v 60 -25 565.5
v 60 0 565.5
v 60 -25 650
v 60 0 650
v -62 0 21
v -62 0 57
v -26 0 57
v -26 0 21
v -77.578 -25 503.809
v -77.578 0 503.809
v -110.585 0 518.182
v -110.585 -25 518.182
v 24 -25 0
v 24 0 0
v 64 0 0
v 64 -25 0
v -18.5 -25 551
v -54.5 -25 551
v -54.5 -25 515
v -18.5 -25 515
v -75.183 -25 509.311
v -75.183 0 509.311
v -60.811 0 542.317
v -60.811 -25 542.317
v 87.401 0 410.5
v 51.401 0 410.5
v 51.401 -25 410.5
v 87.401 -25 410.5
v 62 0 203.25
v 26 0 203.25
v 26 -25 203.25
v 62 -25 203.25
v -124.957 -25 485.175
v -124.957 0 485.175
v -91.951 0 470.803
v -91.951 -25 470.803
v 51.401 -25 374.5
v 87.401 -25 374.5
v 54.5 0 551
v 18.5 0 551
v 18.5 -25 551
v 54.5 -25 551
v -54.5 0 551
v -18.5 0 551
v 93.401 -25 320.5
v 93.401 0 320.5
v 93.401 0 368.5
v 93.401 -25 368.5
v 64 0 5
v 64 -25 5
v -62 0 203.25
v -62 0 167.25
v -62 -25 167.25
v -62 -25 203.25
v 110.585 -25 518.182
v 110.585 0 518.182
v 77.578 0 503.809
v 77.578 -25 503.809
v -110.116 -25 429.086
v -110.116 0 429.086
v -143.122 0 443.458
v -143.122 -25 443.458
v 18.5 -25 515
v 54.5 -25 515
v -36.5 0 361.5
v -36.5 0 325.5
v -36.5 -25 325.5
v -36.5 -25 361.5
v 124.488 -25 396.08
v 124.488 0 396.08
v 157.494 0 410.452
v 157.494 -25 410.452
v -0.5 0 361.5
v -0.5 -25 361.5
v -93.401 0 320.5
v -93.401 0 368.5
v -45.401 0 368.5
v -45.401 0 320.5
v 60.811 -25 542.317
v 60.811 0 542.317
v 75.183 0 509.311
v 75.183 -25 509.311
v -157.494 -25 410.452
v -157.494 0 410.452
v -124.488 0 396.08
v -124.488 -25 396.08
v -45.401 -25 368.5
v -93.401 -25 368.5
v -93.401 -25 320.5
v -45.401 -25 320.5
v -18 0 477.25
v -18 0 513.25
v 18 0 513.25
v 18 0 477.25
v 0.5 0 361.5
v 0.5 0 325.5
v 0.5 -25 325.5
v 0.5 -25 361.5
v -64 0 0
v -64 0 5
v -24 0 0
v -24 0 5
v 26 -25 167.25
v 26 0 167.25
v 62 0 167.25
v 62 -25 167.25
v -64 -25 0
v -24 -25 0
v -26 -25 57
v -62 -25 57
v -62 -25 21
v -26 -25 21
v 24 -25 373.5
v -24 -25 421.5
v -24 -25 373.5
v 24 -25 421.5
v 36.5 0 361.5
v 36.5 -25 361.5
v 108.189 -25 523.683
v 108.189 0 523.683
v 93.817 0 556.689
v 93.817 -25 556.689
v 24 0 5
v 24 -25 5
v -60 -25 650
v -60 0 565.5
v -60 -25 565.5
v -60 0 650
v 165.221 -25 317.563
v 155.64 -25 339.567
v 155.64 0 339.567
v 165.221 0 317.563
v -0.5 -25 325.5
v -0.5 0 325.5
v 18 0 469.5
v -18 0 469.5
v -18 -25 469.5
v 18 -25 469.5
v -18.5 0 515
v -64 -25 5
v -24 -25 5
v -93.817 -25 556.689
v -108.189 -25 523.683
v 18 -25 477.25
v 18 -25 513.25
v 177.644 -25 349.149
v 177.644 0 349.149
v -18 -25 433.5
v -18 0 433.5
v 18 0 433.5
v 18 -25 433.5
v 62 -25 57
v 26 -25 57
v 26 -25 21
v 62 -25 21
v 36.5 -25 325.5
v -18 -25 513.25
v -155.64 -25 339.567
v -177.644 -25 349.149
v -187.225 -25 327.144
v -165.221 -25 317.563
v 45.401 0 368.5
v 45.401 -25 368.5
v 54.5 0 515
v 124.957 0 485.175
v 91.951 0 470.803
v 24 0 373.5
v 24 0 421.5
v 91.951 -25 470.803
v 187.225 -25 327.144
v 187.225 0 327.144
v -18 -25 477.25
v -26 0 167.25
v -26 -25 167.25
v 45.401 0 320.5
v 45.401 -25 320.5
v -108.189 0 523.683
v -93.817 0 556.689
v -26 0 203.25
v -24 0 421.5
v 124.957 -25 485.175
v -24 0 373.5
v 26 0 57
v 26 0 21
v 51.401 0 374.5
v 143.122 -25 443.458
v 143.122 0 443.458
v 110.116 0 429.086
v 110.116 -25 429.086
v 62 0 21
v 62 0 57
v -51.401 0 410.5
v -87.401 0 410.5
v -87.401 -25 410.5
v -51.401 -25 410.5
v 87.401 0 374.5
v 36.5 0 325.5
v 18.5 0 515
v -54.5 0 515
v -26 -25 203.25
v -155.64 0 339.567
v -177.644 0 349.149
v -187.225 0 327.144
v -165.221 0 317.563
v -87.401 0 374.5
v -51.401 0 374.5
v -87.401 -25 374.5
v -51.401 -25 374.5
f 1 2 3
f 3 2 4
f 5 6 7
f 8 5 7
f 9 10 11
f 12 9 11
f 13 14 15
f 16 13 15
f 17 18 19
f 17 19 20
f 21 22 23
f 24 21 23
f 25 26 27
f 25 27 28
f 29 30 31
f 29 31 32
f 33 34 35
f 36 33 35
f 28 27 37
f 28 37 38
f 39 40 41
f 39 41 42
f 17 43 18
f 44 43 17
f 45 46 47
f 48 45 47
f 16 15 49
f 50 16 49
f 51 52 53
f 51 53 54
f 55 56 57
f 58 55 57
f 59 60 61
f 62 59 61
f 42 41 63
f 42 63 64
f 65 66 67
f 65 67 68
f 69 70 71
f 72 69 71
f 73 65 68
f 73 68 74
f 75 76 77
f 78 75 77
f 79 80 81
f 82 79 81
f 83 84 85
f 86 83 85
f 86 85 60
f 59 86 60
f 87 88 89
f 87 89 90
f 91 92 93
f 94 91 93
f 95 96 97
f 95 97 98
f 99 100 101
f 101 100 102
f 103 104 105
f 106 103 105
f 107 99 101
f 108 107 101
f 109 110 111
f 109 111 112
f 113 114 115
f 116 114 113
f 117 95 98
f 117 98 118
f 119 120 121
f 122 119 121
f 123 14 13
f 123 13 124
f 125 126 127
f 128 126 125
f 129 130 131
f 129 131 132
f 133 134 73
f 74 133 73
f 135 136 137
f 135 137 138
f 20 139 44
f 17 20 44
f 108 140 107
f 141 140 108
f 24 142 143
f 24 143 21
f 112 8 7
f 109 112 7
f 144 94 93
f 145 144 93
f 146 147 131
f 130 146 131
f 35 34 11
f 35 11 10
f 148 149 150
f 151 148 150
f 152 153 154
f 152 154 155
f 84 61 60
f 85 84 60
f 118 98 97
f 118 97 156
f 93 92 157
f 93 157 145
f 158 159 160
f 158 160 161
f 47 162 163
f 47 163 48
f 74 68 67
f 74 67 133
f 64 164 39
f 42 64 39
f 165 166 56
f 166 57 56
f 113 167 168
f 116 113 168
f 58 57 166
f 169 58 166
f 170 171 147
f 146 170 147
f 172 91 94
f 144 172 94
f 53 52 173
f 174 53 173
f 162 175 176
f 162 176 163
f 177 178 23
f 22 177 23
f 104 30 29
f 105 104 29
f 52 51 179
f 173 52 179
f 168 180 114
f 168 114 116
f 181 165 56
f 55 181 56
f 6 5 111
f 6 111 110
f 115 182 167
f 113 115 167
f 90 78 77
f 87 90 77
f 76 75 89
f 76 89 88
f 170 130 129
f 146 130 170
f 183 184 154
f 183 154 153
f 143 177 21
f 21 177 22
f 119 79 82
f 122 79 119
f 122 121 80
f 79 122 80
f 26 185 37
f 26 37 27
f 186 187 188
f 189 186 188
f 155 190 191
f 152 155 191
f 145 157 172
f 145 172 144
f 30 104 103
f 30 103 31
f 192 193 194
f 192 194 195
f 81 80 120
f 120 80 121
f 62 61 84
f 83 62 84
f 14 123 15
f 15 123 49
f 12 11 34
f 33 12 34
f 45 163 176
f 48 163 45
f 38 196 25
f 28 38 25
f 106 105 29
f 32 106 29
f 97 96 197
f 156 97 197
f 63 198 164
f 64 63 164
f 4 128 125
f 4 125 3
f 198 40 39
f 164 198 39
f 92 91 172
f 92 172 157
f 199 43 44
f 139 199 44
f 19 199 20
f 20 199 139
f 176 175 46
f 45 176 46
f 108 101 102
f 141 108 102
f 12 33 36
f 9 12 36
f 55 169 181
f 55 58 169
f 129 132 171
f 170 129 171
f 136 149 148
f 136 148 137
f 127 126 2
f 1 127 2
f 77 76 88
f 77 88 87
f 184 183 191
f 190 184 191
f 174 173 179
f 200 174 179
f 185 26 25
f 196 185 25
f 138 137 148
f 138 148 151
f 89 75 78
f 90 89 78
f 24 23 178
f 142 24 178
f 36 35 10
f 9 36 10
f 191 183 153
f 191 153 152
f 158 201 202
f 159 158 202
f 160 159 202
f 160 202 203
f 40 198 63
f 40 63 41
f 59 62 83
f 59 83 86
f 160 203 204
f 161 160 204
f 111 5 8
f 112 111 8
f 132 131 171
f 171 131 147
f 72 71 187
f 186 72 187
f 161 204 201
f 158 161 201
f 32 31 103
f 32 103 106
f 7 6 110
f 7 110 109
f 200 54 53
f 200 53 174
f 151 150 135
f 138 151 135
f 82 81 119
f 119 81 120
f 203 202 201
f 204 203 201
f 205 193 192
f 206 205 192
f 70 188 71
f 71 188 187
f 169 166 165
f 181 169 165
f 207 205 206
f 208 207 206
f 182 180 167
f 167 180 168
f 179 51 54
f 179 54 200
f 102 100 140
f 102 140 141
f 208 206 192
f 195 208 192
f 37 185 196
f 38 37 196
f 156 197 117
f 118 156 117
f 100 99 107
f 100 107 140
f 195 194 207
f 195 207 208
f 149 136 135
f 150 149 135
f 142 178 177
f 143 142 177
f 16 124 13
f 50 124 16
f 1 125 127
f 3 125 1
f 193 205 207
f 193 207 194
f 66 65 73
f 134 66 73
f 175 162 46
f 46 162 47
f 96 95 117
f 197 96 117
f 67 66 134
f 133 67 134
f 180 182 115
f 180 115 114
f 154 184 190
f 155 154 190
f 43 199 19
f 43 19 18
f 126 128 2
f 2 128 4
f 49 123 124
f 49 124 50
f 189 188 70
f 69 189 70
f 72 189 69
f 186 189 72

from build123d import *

# Parameters (mm, degrees)
F1_W     = 36
F1_H     = 36
F1_W_2   = 48
F1_H_2   = 48
F1_W_3   = 120
F1_H_3   = 84.5
F1_W_4   = 40
F1_H_4   = 5
F2_DEPTH = 25


with BuildPart() as f2:
    # F1 (on Front) → F2 (new body)
    with BuildSketch(Plane.XZ):
        with Locations((44, 39)):
            Rectangle(F1_W, F1_H)
        with Locations((44, 185.25)):
            Rectangle(F1_W, F1_H)
        with Locations((69.401393, 344.5)):
            Rectangle(F1_W_2, F1_H_2)
        with Locations((69.401393, 392.5)):
            Rectangle(F1_W, F1_H)
        with Locations((18.5, 343.5)):
            Rectangle(F1_W, F1_H)
        with Locations((0, 397.5)):
            Rectangle(F1_W_2, F1_H_2)
        with Locations((0, 451.5)):
            Rectangle(F1_W, F1_H)
        with Locations((0, 495.25)):
            Rectangle(F1_W, F1_H)
        with Locations((-44, 39)):
            Rectangle(F1_W, F1_H)
        with Locations((-69.401393, 392.5)):
            Rectangle(F1_W, F1_H)
        with Locations((-69.401393, 344.5)):
            Rectangle(F1_W_2, F1_H_2)
        with Locations((-18.5, 343.5)):
            Rectangle(F1_W, F1_H)
        with Locations((-44, 185.25)):
            Rectangle(F1_W, F1_H)
        with Locations((36.5, 533)):
            Rectangle(F1_W, F1_H)
        Polygon((124.48785, 396.079505), (157.494467, 410.451814), (143.122158, 443.458431), (110.115541, 429.086122), align=None)
        Polygon((91.95054, 470.802818), (124.957156, 485.175127), (110.584848, 518.181743), (77.578231, 503.809435), align=None)
        Polygon((75.182846, 509.310537), (108.189463, 523.682846), (93.817154, 556.689463), (60.810537, 542.317154), align=None)
        Polygon((155.639532, 339.567248), (165.221071, 317.562837), (187.225482, 327.144376), (177.643943, 349.148787), align=None)
        Polygon((-110.584848, 518.181743), (-124.957156, 485.175127), (-91.95054, 470.802818), (-77.578231, 503.809435), align=None)
        Polygon((-165.221071, 317.562837), (-155.639532, 339.567248), (-177.643943, 349.148787), (-187.225482, 327.144376), align=None)
        Polygon((-93.817154, 556.689463), (-108.189463, 523.682846), (-75.182846, 509.310537), (-60.810537, 542.317154), align=None)
        with Locations((-36.5, 533)):
            Rectangle(F1_W, F1_H)
        Polygon((-143.122158, 443.458431), (-157.494467, 410.451814), (-124.48785, 396.079505), (-110.115541, 429.086122), align=None)
        with Locations((0, 607.75)):
            Rectangle(F1_W_3, F1_H_3)
        with Locations((44, 2.5)):
            Rectangle(F1_W_4, F1_H_4)
        with Locations((-44, 2.5)):
            Rectangle(F1_W_4, F1_H_4)
    extrude(amount=F2_DEPTH)


solid = f2.part
